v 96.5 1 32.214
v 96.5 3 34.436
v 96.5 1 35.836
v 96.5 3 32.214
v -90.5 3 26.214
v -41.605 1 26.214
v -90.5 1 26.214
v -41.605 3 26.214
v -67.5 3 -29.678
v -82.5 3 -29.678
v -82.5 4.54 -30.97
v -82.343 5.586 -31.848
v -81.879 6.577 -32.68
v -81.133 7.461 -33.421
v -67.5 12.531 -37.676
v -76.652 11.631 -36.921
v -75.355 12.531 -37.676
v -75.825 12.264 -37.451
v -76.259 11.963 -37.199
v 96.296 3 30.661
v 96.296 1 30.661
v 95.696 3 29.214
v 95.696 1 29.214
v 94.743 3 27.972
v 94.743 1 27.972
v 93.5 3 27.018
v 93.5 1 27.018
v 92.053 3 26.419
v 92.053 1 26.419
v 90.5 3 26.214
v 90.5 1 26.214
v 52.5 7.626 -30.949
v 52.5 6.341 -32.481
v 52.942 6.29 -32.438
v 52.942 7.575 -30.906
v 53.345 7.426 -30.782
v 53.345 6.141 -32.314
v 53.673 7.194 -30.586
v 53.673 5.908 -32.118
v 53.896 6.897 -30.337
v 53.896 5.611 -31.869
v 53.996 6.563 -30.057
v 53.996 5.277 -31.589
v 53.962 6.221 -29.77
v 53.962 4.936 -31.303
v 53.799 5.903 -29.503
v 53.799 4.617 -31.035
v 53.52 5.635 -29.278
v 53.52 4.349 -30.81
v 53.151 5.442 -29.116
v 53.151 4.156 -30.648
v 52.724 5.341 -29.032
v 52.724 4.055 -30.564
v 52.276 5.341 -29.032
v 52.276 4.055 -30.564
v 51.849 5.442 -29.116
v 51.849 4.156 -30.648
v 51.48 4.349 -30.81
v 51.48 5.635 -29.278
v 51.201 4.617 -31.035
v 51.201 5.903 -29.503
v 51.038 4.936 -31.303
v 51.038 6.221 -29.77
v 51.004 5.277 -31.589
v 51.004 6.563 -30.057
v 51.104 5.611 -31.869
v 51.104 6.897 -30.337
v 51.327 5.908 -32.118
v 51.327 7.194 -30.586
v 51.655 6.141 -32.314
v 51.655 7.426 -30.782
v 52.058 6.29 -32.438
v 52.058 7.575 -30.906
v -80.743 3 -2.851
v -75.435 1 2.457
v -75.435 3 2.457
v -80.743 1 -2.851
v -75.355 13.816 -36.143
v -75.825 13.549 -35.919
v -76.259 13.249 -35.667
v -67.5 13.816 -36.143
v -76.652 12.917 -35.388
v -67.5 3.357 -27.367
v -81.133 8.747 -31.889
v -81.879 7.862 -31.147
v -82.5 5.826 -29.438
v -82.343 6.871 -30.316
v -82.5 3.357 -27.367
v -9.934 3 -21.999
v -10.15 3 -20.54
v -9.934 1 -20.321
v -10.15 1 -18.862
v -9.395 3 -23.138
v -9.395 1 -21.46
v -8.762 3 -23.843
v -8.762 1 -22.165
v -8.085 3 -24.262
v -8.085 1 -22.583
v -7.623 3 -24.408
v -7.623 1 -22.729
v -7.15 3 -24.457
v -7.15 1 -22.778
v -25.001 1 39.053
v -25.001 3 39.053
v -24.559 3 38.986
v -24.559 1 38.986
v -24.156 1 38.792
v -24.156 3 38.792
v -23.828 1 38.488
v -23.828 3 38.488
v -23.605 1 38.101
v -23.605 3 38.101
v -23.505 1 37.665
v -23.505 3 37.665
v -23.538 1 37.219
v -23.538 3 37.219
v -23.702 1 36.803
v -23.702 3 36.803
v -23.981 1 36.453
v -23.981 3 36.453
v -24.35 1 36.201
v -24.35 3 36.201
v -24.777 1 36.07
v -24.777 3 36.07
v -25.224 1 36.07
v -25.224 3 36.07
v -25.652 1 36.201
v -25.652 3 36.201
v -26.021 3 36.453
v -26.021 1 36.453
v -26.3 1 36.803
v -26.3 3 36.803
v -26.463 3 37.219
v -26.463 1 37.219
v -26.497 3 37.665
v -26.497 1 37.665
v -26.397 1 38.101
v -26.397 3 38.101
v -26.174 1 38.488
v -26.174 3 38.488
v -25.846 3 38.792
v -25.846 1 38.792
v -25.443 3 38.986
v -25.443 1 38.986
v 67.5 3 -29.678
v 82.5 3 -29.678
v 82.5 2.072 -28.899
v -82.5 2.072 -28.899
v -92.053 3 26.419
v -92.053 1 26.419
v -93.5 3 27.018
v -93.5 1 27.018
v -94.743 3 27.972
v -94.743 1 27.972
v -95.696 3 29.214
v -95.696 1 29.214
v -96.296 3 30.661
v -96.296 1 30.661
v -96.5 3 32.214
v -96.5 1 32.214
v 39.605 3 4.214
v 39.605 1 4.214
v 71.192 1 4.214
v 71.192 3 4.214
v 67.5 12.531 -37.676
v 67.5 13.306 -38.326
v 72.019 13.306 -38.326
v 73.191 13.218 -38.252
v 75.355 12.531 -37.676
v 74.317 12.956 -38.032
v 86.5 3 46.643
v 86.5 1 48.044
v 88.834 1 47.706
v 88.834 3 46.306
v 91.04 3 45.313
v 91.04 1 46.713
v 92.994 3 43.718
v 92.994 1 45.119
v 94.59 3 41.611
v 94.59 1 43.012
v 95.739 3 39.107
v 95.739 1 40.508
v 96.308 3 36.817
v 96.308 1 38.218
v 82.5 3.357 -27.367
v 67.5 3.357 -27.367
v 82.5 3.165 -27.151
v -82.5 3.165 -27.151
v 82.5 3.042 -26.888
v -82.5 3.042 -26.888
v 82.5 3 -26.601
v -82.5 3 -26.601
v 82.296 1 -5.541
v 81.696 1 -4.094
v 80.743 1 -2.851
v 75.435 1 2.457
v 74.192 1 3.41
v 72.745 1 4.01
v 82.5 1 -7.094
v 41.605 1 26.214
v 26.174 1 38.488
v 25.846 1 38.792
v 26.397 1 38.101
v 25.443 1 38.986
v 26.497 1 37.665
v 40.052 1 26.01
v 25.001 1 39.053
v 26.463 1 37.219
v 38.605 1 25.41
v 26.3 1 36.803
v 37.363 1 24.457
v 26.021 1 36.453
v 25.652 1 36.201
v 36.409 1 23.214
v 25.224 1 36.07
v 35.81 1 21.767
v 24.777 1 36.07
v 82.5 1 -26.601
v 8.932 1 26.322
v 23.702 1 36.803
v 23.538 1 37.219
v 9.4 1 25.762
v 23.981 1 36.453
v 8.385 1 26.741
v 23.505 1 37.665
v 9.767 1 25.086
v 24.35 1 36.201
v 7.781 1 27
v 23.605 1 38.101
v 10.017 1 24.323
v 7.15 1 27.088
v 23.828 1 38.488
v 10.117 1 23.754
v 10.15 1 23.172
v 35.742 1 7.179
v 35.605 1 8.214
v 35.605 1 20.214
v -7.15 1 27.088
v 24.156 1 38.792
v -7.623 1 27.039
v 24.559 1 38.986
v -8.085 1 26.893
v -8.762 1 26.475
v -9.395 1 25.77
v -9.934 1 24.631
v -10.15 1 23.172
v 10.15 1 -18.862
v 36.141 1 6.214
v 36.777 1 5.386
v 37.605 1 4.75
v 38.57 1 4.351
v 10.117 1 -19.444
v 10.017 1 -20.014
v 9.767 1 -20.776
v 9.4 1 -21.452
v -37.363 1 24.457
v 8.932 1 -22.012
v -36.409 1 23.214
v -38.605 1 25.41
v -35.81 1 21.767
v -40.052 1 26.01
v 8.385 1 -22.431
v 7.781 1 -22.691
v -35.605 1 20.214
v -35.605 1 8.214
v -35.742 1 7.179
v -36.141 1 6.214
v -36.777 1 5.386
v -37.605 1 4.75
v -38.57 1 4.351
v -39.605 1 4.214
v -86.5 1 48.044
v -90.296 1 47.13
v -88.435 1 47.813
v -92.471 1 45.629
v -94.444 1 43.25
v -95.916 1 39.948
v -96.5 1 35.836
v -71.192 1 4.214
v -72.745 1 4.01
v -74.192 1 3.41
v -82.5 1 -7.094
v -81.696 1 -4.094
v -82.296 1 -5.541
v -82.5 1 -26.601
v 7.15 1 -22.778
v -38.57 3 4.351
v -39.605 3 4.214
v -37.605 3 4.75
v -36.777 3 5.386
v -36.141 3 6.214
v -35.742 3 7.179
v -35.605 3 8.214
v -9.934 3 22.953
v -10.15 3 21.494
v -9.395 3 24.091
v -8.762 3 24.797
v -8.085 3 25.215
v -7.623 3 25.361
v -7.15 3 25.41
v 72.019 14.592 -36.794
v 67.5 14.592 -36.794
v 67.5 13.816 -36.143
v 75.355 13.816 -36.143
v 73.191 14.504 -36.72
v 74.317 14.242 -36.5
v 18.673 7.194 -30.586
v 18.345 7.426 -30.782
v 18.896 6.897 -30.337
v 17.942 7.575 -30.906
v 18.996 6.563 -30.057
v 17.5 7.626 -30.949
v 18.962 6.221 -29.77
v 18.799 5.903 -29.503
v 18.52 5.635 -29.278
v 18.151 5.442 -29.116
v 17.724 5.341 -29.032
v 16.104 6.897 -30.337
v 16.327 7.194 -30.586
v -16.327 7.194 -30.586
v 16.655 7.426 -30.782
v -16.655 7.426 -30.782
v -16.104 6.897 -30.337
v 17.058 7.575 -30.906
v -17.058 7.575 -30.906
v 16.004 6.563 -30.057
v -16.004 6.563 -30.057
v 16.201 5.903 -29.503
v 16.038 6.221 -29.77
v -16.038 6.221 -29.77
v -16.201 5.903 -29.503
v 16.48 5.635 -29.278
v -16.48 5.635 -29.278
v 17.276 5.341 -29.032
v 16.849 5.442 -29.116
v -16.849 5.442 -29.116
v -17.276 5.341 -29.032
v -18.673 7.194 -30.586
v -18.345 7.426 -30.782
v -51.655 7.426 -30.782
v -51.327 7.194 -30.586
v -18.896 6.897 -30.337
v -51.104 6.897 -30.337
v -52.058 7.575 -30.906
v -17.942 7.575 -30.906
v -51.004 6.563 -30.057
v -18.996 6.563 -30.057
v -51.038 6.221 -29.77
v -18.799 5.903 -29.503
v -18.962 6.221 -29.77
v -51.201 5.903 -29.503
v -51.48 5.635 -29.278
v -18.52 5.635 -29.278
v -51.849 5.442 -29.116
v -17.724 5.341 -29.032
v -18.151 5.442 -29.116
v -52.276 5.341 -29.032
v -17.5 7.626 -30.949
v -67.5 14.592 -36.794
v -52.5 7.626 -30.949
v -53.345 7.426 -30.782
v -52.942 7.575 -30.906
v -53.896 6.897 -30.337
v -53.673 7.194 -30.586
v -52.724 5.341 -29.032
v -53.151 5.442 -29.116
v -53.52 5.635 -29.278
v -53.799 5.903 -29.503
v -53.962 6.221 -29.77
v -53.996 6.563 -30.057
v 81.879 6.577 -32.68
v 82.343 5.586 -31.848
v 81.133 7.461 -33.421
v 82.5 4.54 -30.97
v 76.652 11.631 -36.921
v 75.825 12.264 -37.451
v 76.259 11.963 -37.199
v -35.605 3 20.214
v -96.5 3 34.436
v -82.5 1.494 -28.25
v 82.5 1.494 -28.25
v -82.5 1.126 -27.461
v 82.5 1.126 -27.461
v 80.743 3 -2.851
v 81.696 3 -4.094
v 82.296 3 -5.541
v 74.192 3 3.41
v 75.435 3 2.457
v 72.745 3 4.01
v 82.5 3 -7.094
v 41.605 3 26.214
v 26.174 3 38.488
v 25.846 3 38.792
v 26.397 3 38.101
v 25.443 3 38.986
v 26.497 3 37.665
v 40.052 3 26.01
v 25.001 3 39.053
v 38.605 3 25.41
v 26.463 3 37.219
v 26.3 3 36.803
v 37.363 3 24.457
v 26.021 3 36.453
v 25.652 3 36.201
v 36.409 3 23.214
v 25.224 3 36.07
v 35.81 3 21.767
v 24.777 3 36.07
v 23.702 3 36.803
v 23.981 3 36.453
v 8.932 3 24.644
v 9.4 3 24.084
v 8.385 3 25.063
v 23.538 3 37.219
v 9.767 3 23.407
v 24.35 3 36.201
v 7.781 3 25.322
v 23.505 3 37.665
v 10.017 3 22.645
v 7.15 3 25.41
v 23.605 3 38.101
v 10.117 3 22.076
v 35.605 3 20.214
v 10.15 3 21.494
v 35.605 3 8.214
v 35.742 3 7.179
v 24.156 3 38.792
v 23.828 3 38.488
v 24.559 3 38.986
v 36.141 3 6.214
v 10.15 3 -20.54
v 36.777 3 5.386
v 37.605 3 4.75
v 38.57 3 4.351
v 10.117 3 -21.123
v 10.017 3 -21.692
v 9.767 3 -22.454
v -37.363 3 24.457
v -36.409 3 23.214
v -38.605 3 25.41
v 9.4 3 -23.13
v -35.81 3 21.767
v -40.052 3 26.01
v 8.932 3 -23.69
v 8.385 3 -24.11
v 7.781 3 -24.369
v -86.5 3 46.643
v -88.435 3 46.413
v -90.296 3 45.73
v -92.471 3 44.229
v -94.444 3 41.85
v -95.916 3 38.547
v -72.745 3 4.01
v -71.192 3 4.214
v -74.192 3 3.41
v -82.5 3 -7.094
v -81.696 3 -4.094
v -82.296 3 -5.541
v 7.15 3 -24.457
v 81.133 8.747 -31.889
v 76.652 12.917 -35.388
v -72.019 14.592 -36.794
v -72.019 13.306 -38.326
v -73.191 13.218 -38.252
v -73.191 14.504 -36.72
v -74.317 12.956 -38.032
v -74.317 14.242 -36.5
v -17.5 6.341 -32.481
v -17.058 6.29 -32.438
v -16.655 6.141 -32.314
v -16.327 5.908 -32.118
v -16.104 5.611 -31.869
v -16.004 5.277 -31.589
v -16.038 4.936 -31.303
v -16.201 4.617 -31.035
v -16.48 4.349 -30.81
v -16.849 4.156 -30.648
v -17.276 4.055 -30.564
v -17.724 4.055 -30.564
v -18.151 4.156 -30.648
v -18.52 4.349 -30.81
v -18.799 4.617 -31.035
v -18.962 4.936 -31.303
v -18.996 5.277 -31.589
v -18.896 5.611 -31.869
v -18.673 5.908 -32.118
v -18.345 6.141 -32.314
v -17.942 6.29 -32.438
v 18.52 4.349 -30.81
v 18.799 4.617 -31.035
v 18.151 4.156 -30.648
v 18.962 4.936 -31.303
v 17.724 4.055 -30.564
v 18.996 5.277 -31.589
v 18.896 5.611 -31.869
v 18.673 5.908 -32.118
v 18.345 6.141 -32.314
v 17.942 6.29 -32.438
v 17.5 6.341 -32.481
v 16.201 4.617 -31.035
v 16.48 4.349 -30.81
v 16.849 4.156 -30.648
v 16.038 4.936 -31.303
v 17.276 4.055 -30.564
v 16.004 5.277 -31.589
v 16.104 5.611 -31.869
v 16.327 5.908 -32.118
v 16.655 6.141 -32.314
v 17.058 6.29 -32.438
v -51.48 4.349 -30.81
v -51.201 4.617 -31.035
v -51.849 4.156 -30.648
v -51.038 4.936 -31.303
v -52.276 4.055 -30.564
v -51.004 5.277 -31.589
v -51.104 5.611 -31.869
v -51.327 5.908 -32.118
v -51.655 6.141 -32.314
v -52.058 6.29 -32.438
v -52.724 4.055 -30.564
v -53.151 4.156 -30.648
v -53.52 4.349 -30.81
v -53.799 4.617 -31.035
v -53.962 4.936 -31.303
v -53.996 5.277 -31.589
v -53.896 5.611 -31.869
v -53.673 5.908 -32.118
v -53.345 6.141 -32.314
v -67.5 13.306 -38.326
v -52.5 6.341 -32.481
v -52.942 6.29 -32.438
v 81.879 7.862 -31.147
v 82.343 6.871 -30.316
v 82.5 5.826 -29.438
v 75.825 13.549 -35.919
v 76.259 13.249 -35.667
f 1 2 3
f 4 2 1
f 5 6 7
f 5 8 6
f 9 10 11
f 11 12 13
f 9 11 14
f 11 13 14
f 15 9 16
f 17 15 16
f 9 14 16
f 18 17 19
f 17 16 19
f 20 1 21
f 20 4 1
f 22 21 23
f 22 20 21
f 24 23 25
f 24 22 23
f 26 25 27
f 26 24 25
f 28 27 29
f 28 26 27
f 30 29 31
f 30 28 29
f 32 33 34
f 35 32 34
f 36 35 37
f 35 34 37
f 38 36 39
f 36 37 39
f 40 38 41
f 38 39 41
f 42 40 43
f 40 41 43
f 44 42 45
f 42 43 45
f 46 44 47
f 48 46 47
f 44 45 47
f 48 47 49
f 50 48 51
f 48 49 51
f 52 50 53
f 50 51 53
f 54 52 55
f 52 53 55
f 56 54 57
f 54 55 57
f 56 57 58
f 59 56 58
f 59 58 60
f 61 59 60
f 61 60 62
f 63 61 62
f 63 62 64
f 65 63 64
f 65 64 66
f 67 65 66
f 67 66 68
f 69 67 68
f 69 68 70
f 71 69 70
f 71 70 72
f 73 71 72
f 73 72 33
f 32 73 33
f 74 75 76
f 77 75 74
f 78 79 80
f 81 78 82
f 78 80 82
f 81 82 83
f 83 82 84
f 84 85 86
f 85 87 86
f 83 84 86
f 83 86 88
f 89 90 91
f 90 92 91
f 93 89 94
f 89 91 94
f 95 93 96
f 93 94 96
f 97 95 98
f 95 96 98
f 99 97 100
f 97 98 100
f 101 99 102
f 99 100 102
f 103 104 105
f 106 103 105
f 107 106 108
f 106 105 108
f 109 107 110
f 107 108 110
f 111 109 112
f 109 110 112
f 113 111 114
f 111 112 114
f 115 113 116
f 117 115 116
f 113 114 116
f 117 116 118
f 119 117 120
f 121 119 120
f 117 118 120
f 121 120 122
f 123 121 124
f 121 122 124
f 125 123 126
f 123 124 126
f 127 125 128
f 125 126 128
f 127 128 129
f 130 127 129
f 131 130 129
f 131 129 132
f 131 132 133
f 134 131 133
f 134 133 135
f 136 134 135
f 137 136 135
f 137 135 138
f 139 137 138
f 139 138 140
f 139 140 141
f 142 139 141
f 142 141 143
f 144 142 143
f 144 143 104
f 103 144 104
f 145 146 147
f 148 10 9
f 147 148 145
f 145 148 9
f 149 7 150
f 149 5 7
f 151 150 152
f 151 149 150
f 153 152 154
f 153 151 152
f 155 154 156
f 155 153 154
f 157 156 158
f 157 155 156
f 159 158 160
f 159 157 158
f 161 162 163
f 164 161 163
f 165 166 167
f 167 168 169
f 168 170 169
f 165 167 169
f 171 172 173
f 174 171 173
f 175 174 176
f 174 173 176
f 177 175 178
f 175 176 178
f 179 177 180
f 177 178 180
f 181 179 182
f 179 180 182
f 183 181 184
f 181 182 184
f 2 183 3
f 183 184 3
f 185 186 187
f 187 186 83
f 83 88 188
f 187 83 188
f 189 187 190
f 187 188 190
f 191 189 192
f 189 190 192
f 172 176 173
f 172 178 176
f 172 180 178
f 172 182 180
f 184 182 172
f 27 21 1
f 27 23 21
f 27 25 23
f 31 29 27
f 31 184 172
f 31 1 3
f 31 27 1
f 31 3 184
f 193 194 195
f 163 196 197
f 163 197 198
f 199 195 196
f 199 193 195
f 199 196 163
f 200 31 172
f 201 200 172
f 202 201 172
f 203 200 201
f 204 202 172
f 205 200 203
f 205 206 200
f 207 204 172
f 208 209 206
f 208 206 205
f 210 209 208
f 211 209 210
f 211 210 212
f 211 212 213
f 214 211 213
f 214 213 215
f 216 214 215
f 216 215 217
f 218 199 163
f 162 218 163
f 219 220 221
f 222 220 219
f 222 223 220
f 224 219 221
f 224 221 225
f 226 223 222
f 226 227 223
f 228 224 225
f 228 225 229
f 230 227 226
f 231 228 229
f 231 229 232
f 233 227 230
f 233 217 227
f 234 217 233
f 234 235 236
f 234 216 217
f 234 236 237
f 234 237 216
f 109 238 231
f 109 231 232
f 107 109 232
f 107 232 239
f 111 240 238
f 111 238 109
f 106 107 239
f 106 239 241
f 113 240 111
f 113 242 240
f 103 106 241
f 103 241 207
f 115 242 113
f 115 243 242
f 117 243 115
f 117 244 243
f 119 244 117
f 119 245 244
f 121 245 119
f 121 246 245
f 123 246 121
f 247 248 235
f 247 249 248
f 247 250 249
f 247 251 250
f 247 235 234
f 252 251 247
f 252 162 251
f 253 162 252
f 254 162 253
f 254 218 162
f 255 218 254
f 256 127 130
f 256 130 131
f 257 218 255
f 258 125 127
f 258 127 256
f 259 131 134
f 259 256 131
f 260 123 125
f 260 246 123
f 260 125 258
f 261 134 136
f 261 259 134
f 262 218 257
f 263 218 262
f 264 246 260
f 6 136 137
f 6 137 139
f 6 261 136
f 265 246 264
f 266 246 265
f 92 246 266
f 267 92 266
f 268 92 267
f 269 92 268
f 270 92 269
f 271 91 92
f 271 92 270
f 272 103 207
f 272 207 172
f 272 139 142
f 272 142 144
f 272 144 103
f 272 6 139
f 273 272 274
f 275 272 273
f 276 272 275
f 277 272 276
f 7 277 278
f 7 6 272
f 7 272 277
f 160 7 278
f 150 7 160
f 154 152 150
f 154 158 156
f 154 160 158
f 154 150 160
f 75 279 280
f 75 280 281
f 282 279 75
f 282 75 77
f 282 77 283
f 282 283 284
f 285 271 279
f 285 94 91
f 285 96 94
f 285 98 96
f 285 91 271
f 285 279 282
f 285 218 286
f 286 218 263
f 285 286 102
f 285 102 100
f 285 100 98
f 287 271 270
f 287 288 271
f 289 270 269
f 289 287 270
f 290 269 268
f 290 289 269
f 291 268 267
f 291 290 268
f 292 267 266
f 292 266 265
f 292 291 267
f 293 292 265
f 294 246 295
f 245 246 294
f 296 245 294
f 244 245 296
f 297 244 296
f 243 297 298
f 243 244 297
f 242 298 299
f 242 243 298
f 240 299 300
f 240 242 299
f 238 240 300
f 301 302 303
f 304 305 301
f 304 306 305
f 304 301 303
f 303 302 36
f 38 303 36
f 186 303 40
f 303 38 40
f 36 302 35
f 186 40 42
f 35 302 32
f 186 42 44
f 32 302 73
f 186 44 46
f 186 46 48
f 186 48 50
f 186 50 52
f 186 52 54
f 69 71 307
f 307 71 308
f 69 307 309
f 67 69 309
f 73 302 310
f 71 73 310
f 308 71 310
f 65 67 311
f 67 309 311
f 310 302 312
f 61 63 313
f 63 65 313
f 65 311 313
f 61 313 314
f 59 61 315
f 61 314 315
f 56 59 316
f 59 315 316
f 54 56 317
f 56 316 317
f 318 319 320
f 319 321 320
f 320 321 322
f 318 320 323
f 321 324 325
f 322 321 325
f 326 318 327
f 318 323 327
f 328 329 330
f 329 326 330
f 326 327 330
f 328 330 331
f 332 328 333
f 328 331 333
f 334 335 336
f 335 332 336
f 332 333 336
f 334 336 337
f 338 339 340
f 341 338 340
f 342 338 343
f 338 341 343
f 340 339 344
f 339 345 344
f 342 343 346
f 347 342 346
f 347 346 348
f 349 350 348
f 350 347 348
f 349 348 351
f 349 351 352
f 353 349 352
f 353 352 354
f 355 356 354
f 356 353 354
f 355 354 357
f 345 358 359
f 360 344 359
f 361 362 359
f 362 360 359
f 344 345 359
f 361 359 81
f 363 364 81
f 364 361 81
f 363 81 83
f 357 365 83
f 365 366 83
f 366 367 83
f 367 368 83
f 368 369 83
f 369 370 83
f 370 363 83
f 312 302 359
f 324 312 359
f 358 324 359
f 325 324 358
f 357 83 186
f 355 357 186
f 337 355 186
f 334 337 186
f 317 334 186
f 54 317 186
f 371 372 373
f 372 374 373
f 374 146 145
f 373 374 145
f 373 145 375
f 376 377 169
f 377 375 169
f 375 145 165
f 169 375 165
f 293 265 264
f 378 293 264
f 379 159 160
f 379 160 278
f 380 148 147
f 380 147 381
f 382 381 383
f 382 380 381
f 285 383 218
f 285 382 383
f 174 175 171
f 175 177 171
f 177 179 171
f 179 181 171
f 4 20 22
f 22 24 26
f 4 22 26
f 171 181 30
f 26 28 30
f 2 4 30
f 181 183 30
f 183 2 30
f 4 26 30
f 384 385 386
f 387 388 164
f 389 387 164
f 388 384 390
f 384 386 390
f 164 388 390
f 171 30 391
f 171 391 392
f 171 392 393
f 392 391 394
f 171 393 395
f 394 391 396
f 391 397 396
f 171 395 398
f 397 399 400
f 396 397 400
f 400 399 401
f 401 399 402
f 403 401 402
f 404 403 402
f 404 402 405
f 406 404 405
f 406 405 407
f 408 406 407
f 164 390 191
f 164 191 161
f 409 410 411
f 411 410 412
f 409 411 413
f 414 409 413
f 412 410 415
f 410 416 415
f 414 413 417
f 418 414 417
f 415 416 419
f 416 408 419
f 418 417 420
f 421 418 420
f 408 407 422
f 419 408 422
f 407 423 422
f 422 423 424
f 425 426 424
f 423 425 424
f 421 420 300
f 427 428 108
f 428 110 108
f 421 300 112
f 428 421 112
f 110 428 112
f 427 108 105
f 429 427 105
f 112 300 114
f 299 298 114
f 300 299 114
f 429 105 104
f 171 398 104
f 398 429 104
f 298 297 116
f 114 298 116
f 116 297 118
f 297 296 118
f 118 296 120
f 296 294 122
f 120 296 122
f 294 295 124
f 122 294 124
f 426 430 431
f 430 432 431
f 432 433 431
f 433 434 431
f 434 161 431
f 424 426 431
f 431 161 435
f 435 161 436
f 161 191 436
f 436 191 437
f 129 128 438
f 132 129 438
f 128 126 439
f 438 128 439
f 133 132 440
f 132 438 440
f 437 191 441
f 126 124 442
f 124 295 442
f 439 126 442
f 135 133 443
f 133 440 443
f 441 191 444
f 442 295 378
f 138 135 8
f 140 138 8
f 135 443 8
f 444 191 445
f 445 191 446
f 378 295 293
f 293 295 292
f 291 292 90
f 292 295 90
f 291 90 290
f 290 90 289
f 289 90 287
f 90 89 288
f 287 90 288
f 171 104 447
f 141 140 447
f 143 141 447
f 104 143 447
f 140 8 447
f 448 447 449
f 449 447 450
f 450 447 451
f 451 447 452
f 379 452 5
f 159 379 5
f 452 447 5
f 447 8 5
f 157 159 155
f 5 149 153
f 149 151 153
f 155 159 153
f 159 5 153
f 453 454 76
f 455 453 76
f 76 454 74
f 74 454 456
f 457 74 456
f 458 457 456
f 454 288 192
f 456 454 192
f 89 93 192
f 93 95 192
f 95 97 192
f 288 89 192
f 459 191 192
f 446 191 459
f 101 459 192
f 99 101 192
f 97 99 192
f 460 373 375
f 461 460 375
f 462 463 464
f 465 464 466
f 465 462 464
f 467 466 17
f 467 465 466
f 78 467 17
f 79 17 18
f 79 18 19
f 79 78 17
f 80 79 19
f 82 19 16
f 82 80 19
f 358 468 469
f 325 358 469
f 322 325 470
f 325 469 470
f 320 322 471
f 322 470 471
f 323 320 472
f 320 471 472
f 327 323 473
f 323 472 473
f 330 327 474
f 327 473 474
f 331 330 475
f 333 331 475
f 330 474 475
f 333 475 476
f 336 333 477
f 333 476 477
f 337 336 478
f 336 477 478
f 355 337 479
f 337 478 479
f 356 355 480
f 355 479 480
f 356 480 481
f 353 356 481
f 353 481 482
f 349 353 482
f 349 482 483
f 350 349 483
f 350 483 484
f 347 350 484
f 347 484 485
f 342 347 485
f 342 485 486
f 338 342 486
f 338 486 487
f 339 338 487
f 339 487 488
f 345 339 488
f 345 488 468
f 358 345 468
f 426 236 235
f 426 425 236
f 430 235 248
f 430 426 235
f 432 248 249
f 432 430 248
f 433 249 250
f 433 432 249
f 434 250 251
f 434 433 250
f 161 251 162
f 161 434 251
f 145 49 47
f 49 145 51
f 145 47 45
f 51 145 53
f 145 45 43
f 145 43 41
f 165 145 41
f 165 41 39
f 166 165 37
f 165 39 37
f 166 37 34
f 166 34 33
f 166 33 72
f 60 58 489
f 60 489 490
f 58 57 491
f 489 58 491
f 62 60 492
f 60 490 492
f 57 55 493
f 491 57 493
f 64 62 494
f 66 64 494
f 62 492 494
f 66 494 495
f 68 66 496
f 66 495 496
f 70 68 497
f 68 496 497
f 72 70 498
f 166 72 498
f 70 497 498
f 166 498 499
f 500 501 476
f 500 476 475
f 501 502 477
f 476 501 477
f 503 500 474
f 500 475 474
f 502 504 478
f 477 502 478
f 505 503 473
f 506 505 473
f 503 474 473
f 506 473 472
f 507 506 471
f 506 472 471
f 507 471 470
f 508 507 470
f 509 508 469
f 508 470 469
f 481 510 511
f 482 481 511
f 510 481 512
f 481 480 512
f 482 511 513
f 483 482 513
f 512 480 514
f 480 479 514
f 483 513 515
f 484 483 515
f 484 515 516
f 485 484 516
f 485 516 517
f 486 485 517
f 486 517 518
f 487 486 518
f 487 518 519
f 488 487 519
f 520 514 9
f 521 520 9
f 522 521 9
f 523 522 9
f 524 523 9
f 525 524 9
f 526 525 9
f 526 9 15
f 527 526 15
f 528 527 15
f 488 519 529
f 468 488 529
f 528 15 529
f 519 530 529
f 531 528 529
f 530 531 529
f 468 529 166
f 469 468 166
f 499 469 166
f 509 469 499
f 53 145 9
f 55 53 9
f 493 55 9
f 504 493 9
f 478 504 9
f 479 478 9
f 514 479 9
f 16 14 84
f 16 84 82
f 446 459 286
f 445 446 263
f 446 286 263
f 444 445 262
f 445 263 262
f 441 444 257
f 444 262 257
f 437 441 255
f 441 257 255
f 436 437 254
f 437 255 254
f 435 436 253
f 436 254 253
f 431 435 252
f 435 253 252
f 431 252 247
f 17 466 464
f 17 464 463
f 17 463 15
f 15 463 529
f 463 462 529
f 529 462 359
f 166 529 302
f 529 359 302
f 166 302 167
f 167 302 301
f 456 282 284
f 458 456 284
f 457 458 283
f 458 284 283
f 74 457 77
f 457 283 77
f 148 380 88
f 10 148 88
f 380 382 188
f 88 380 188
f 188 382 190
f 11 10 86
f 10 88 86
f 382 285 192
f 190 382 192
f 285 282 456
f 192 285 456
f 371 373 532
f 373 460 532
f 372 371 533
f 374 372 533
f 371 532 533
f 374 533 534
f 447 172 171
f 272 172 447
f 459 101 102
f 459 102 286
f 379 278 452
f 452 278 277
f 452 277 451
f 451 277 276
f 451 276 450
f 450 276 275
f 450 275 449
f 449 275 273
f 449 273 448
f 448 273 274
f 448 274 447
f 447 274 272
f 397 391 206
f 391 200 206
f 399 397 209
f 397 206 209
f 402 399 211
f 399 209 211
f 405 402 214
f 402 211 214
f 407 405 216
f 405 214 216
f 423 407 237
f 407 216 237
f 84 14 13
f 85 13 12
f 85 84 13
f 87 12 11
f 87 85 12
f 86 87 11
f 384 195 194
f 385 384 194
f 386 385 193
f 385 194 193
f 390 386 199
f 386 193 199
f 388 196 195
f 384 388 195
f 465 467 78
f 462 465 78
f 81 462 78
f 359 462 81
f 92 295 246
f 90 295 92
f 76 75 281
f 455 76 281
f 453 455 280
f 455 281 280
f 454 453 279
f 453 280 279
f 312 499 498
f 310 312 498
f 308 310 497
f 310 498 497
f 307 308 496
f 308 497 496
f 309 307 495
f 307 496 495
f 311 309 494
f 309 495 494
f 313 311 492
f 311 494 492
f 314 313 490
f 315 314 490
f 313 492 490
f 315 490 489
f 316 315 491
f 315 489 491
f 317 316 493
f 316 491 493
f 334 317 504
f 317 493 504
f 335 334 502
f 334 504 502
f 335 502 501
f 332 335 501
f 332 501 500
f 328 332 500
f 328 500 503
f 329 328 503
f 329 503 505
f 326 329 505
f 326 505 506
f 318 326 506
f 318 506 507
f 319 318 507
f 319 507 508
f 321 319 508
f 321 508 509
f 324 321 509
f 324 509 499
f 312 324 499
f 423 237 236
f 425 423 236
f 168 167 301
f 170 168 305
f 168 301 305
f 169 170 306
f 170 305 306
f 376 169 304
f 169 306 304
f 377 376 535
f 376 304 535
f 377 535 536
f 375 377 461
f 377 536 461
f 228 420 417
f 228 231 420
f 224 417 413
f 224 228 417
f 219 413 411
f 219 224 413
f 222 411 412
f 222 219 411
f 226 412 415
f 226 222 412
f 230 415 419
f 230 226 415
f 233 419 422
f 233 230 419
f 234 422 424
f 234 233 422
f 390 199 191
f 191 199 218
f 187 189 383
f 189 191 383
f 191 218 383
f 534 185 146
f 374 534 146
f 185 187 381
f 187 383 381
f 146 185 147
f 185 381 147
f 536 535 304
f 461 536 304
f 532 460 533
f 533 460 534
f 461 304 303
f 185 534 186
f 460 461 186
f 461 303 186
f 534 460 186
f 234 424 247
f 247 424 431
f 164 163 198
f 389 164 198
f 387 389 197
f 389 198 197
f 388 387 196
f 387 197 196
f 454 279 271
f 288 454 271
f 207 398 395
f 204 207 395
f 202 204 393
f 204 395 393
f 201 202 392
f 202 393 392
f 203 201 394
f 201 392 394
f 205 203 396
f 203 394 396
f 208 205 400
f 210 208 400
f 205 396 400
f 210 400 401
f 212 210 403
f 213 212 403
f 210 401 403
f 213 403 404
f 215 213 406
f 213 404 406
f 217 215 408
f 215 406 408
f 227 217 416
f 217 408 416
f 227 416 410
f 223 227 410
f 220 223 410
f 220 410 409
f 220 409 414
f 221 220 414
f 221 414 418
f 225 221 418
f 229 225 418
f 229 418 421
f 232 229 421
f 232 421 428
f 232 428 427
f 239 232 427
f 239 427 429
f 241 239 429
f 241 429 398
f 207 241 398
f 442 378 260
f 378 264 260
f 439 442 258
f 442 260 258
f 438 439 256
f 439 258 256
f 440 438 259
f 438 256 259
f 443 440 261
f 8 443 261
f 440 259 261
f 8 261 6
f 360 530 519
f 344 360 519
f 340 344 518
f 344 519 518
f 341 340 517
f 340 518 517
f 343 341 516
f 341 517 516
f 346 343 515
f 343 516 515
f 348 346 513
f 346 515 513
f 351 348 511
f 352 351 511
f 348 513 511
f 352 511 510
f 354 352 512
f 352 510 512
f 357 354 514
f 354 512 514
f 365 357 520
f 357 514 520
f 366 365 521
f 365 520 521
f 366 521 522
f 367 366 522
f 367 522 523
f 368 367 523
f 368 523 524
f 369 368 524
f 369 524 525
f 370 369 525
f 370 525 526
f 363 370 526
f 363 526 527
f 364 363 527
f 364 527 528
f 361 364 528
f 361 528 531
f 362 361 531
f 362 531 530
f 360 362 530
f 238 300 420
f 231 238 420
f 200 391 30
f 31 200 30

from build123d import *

# Parameters (mm, degrees)
SKETCH_1_W              = 165
SKETCH_1_H              = 108
EXTRUDE_1_DEPTH         = 3
SHEET_METAL_2_OUTLINE_W = 165
SHEET_METAL_2_OUTLINE_H = 108
SHEET_METAL_2_DEPTH     = 1
OTHER_START             = -82.5
OTHER_1_DEPTH           = 165
OTHER_1_2_DEPTH         = 165
SKETCH_14_W             = 50
SKETCH_14_H             = 35
CUT_EXTRUDE_1_DEPTH     = 2
FILLET_1_R              = 5
SKETCH_20_R             = 1.75
CUT_EXTRUDE_7_DEPTH     = 10
SKETCH_24_W             = 165
SKETCH_24_H             = 1
CUT_EXTRUDE_11_DEPTH    = 10
SKETCH_25_W             = 17
SKETCH_25_H             = 2
EXTRUDE_2_DEPTH         = 14
SKETCH_26_W             = 17
SKETCH_26_H             = 2
EXTRUDE_3_DEPTH         = 14
FILLET_6_R              = 10
SKETCH_27_R             = 2.25
CUT_EXTRUDE_12_DEPTH    = 10
SKETCH_28_R             = 1.75
CUT_EXTRUDE_13_DEPTH    = 113.27486947
SKETCH_29_W             = 15
SKETCH_29_H             = 12
CUT_EXTRUDE_14_DEPTH    = 10
FILLET_8_R              = 3
OTHER_START_2           = 3
OTHER_1_3_DEPTH         = 21
OTHER_START_3           = 1
OTHER_1_3_2_OUTLINE_R   = 1.75
OTHER_1_3_2_DEPTH       = 2
OTHER_START_4           = -42
OTHER_1_4_OUTLINE_R     = 1.75
OTHER_1_4_DEPTH         = 10.030896321
OTHER_1_4_2_DEPTH       = 165
OTHER_START_5           = -67.5
OTHER_1_4_3_DEPTH       = 135
OTHER_1_4_4_DEPTH       = 165
OTHER_START_6           = -20.806456798
OTHER_1_4_5_OUTLINE_R   = 1.75
OTHER_1_4_5_DEPTH       = 2
CUT_EXTRUDE_20_DEPTH    = 10
FILLET_9_R              = 3
EXTRUDE_4_DEPTH         = 2
EXTRUDE_5_DEPTH         = 2
CUT_EXTRUDE_21_REACH    = 133.427
SKETCH_34_W             = 20.3
SKETCH_34_H             = 38.2
SKETCH_38_R             = 2.25
SKETCH_38_R_2           = 1.75
EXTRUDE_6_DEPTH         = 2
CUT_EXTRUDE_23_DEPTH    = 10
EXTRUDE_START           = -2
SKETCH_47_R             = 1.75
EXTRUDE_9_DEPTH         = 2
CUT_EXTRUDE_27_DEPTH    = 10
FILLET_14_R             = 3.3
FILLET_17_R             = 3
SKETCH_51_W             = 12.822687145
SKETCH_51_H             = 2
EXTRUDE_12_DEPTH        = 24
SKETCH_56_W             = 8.820712464
SKETCH_56_H             = 2.159181397
SKETCH_56_W_2           = 10.112203134
EXTRUDE_13_DEPTH        = 2
SKETCH_55_W             = 243.511424265
SKETCH_55_H             = 14.236732763
CUT_EXTRUDE_29_DEPTH    = 123.832146316
CUT_EXTRUDE_30_REACH    = 112.932
SKETCH_58_W             = 44.071930239
SKETCH_58_H             = 30
CUT_EXTRUDE_33_REACH    = 119.8
SKETCH_62_W             = 205
SKETCH_62_H             = 60.625088721
FILLET_18_R             = 4
SKETCH_63_R             = 1.5
CUT_EXTRUDE_34_DEPTH    = 10
CUT_EXTRUDE_35_REACH    = 110.652
EXTRUDE_16_DEPTH        = 8
EXTRUDE_16_DEPTH_BACK   = 5
FILLET_23_R             = 6
FILLET_25_R             = 6
CUT_EXTRUDE_36_DEPTH    = 4
FILLET_26_R             = 6
FILLET_27_R             = 10
CUT_EXTRUDE_38_REACH    = 110.42
SKETCH_72_R             = 1.5


with BuildPart() as part:
    # 草图1 → 凸台-拉伸1 (new body)
    with BuildSketch(Plane(origin=(0, 0, 0), x_dir=(1, 0, 0), z_dir=(0, 1, 0))):
        Rectangle(SKETCH_1_W, SKETCH_1_H)
    extrude(amount=EXTRUDE_1_DEPTH)

    # Sheet Metal 2: read off the stored shape, not the designer's step
    # Sheet Metal 2 outline → Sheet Metal 2 (cut)
    with BuildSketch(Plane(origin=(0, 0, 0), x_dir=(1, 0, 0), z_dir=(0, 1, 0))):
        Rectangle(SHEET_METAL_2_OUTLINE_W, SHEET_METAL_2_OUTLINE_H)
    extrude(amount=SHEET_METAL_2_DEPTH, mode=Mode.SUBTRACT)

    # Other 1: read off the stored shape, not the designer's step
    # Other 1 outline → Other 1 (cut)
    with BuildSketch(Plane.YZ.offset(OTHER_START)):
        with BuildLine():
            Line((3, -54), (3, -29.678199262))
            Line((3, -29.678199262), (2.071637171, -28.899210355))
            ThreePointArc((2.071637171, -28.899210355), (1.281076639, -27.868931811), (1, -26.601077026))
            Line((1, -26.601077026), (1, -54))
            Line((1, -54), (3, -54))
        make_face()
    extrude(amount=OTHER_1_DEPTH, mode=Mode.SUBTRACT)

    # Other 1 2 outline → Other 1 2 (add)
    with BuildSketch(Plane.YZ.offset(OTHER_START)):
        with BuildLine():
            Line((3, -29.678199262), (21.723430088, -45.389022544))
            Line((21.723430088, -45.389022544), (23.009005307, -43.856933657))
            Line((23.009005307, -43.856933657), (3.35721239, -27.367121469))
            ThreePointArc((3.35721239, -27.367121469), (3.093692213, -27.023695287), (3, -26.601077026))
            Line((3, -26.601077026), (3, -29.678199262))
        make_face()
    extrude(amount=OTHER_1_2_DEPTH)

    # 草图14 → 切除-拉伸1 (cut)
    with BuildSketch(Plane.XZ.offset(-1)):
        with Locations((35, -1.601077026)):
            Rectangle(SKETCH_14_W, SKETCH_14_H)
        with Locations((-35, -1.601077026)):
            Rectangle(SKETCH_14_W, SKETCH_14_H)
    extrude(amount=-CUT_EXTRUDE_1_DEPTH, mode=Mode.SUBTRACT)

    # 圆角1
    fillet_1_edges = [part.edges().sort_by_distance(p)[0] for p in [
        (60, 2, 15.898922974),
        (60, 2, -19.101077026),
        (10, 2, -19.101077026),
        (10, 2, 15.898922974),
        (-10, 2, 15.898922974),
        (-10, 2, -19.101077026),
        (-60, 2, -19.101077026),
        (-60, 2, 15.898922974),
    ]]
    fillet(fillet_1_edges, radius=FILLET_1_R)

    # 草图20 → 切除-拉伸7 (cut)
    with BuildSketch(Plane(origin=(0, -12.088557412, -14.406581725), x_dir=(1, 0, 0), z_dir=(0, 0.6427876096865379, 0.7660444431189792))):
        with Locations(Location((-17.5, 37.816614211, 0), (0, 0, 270))):
            Circle(SKETCH_20_R)
        with Locations(Location((-52.5, 37.816614211, 0), (0, 0, 270))):
            Circle(SKETCH_20_R)
        with Locations(Location((17.5, 37.816614211, 0), (0, 0, 270))):
            Circle(SKETCH_20_R)
        with Locations(Location((52.5, 37.816614211, 0), (0, 0, 270))):
            Circle(SKETCH_20_R)
    extrude(amount=-CUT_EXTRUDE_7_DEPTH, mode=Mode.SUBTRACT)

    # 草图24 → 切除-拉伸11 (cut)
    with BuildSketch(Plane(origin=(0, 3, 0), x_dir=(1, 0, 0), z_dir=(0, 1, 0))):
        with Locations((0, -53.5)):
            Rectangle(SKETCH_24_W, SKETCH_24_H)
    extrude(amount=-CUT_EXTRUDE_11_DEPTH, mode=Mode.SUBTRACT)

    # 草图25 → 凸台-拉伸2 (add)
    with BuildSketch(Plane.ZY.offset(82.5)):
        with Locations((44.5, 2)):
            Rectangle(SKETCH_25_W, SKETCH_25_H)
    extrude(amount=EXTRUDE_2_DEPTH)

    # 草图26 → 凸台-拉伸3 (add)
    with BuildSketch(Plane(origin=(82.5, 0, 0), x_dir=(0, 0, -1), z_dir=(1, 0, 0))):
        with Locations((-44.5, 2)):
            Rectangle(SKETCH_26_W, SKETCH_26_H)
    extrude(amount=EXTRUDE_3_DEPTH)

    # 圆角6
    fillet_6_edges = [part.edges().sort_by_distance(p)[0] for p in [
        (-82.5, 2, 36),
        (82.5, 2, 36),
    ]]
    fillet(fillet_6_edges, radius=FILLET_6_R)

    # 草图27 → 切除-拉伸12 (cut)
    with BuildSketch(Plane(origin=(0, 3, 0), x_dir=(1, 0, 0), z_dir=(0, 1, 0))):
        with Locations(Location((-73.3, -43.8, 0), (0, 0, 270))):
            Circle(SKETCH_27_R)
        with Locations(Location((73.3, -43.8, 0), (0, 0, 270))):
            Circle(SKETCH_27_R)
    extrude(amount=-CUT_EXTRUDE_12_DEPTH, mode=Mode.SUBTRACT)

    # 草图28 → 切除-拉伸13 (cut, through all)
    with BuildSketch(Plane.XZ.offset(-1)):
        with Locations(Location((-70.5, 8.898922974, 0), (0, 0, 270))):
            Circle(SKETCH_28_R)
        with Locations(Location((70.5, 8.898922974, 0), (0, 0, 270))):
            Circle(SKETCH_28_R)
    extrude(amount=-CUT_EXTRUDE_13_DEPTH, mode=Mode.SUBTRACT)

    # 草图29 → 切除-拉伸14 (cut)
    with BuildSketch(Plane(origin=(0, -12.088557412, -14.406581725), x_dir=(1, 0, 0), z_dir=(0, 0.6427876096865379, 0.7660444431189792))):
        with Locations((-75, 39.816614211)):
            Rectangle(SKETCH_29_W, SKETCH_29_H)
        with Locations((75, 39.816614211)):
            Rectangle(SKETCH_29_W, SKETCH_29_H)
    extrude(amount=-CUT_EXTRUDE_14_DEPTH, mode=Mode.SUBTRACT)

    # 圆角8
    fillet_8_edges = [part.edges().sort_by_distance(p)[0] for p in [
        (-96.5, 2, 53),
        (-96.5, 2, 36),
        (96.5, 2, 53),
        (96.5, 2, 36),
    ]]
    fillet(fillet_8_edges, radius=FILLET_8_R)

    # Other 1 3: read off the stored shape, not the designer's step
    # Other 1 3 outline → Other 1 3 (cut)
    with BuildSketch(Plane(origin=(0, 0, 0), x_dir=(1, 0, 0), z_dir=(0, 1, 0)).offset(OTHER_START_2)):
        Polygon((-67.5, 42), (-82.5, 42), (-82.5, 25), (82.5, 25), (82.5, 42), (67.5, 42), (67.5, 54), (-67.5, 54), align=None)
    extrude(amount=OTHER_1_3_DEPTH, mode=Mode.SUBTRACT)

    # Other 1 3 2 outline → Other 1 3 2 (add)
    with BuildSketch(Plane(origin=(0, 0, 0), x_dir=(1, 0, 0), z_dir=(0, 1, 0)).offset(OTHER_START_3)):
        Polygon((-67.5, 42), (-82.5, 42), (-82.5, 25), (82.5, 25), (82.5, 42), (67.5, 42), (67.5, 54), (-67.5, 54), align=None)
        with Locations((17.5, 46)):
            Circle(OTHER_1_3_2_OUTLINE_R, mode=Mode.SUBTRACT)
        with Locations((52.5, 46)):
            Circle(OTHER_1_3_2_OUTLINE_R, mode=Mode.SUBTRACT)
        with Locations((-52.5, 46)):
            Circle(OTHER_1_3_2_OUTLINE_R, mode=Mode.SUBTRACT)
        with Locations((-17.5, 46)):
            Circle(OTHER_1_3_2_OUTLINE_R, mode=Mode.SUBTRACT)
    extrude(amount=OTHER_1_3_2_DEPTH)

    # Other 1 4: read off the stored shape, not the designer's step
    # Other 1 4 outline → Other 1 4 (cut)
    with BuildSketch(Plane(origin=(0, 0, 0), x_dir=(1, 0, 0), z_dir=(0, 0.6427876096865381, 0.7660444431189791)).offset(OTHER_START_4)):
        with Locations((-17.5, 37.816614211)):
            Circle(OTHER_1_4_OUTLINE_R)
        with Locations((-52.5, 37.816614211)):
            Circle(OTHER_1_4_OUTLINE_R)
        with Locations((17.5, 37.816614211)):
            Circle(OTHER_1_4_OUTLINE_R)
        with Locations((52.5, 37.816614211)):
            Circle(OTHER_1_4_OUTLINE_R)
    extrude(amount=OTHER_1_4_DEPTH, mode=Mode.SUBTRACT)

    # Other 1 4 2 outline → Other 1 4 2 (cut)
    with BuildSketch(Plane.YZ.offset(OTHER_START)):
        with BuildLine():
            Line((3, -29.678199262), (2.071637171, -28.899210355))
            ThreePointArc((2.071637171, -28.899210355), (1.281076639, -27.868931811), (1, -26.601077026))
            Line((1, -26.601077026), (1, -54))
            Line((1, -54), (3, -54))
            Line((3, -54), (3, -29.678199262))
        make_face()
    extrude(amount=OTHER_1_4_2_DEPTH, mode=Mode.SUBTRACT)

    # Other 1 4 3 outline → Other 1 4 3 (add)
    with BuildSketch(Plane.YZ.offset(OTHER_START_5)):
        with BuildLine():
            Line((21.723430088, -45.389022544), (23.009005307, -43.856933657))
            Line((23.009005307, -43.856933657), (3.35721239, -27.367121469))
            ThreePointArc((3.35721239, -27.367121469), (3.093692213, -27.023695287), (3, -26.601077026))
            Line((3, -26.601077026), (3, -29.678199262))
            Line((3, -29.678199262), (21.723430088, -45.389022544))
        make_face()
    extrude(amount=OTHER_1_4_3_DEPTH)

    # Other 1 4 4 outline → Other 1 4 4 (add)
    with BuildSketch(Plane.YZ.offset(OTHER_START)):
        with BuildLine():
            Line((3, -29.678199262), (12.530896771, -37.675571228))
            Line((12.530896771, -37.675571228), (13.81647199, -36.143482341))
            Line((13.81647199, -36.143482341), (3.35721239, -27.367121469))
            ThreePointArc((3.35721239, -27.367121469), (3.093692213, -27.023695287), (3, -26.601077026))
            Line((3, -26.601077026), (3, -29.678199262))
        make_face()
    extrude(amount=OTHER_1_4_4_DEPTH)

    # Other 1 4 5 outline → Other 1 4 5 (cut)
    with BuildSketch(Plane(origin=(0, 0, 0), x_dir=(1, 0, 0), z_dir=(0, 0.6427876096865381, 0.7660444431189791)).offset(OTHER_START_6)):
        with Locations((-17.5, 37.816614211)):
            Circle(OTHER_1_4_5_OUTLINE_R)
        with Locations((-52.5, 37.816614211)):
            Circle(OTHER_1_4_5_OUTLINE_R)
        with Locations((17.5, 37.816614211)):
            Circle(OTHER_1_4_5_OUTLINE_R)
        with Locations((52.5, 37.816614211)):
            Circle(OTHER_1_4_5_OUTLINE_R)
    extrude(amount=OTHER_1_4_5_DEPTH, mode=Mode.SUBTRACT)

    # 草图31 → 切除-拉伸20 (cut)
    with BuildSketch(Plane(origin=(0, -12.088557412, -14.406581725), x_dir=(1, 0, 0), z_dir=(0, 0.6427876096865379, 0.7660444431189792))):
        Polygon((0, 45.816614211), (8, 45.816614211), (8, 39.795572536), (-8, 39.795572536), (-8, 45.816614211), align=None)
    extrude(amount=-CUT_EXTRUDE_20_DEPTH, mode=Mode.SUBTRACT)

    # 圆角9
    fillet_9_edges = [part.edges().sort_by_distance(p)[0] for p in [
        (8, 17.753832181, -40.752727114),
        (-8, 17.753832181, -40.752727114),
    ]]
    fillet(fillet_9_edges, radius=FILLET_9_R)

    # 草图32 → 凸台-拉伸4 (add)
    with BuildSketch(Plane(origin=(0, 3, 0), x_dir=(1, 0, 0), z_dir=(0, 1, 0))):
        with BuildLine():
            Line((55, -15.898922974), (15, -15.898922974))
            ThreePointArc((15, -15.898922974), (11.464466094, -14.43445688), (10, -10.898922974))
            Line((10, -10.898922974), (10, 14.101077026))
            ThreePointArc((10, 14.101077026), (11.464466094, 17.636610931), (15, 19.101077026))
            Line((15, 19.101077026), (55, 19.101077026))
            ThreePointArc((55, 19.101077026), (58.535533906, 17.636610931), (60, 14.101077026))
            Line((60, 14.101077026), (60, -10.898922974))
            ThreePointArc((60, -10.898922974), (58.535533906, -14.43445688), (55, -15.898922974))
        make_face()
    extrude(amount=-EXTRUDE_4_DEPTH)

    # 草图33 → 凸台-拉伸5 (add)
    with BuildSketch(Plane(origin=(0, 3, 0), x_dir=(1, 0, 0), z_dir=(0, 1, 0))):
        with BuildLine():
            Line((-55, 19.101077026), (-15, 19.101077026))
            ThreePointArc((-15, 19.101077026), (-11.464466094, 17.636610931), (-10, 14.101077026))
            Line((-10, 14.101077026), (-10, -10.898922974))
            ThreePointArc((-10, -10.898922974), (-11.464466094, -14.43445688), (-15, -15.898922974))
            Line((-15, -15.898922974), (-55, -15.898922974))
            ThreePointArc((-55, -15.898922974), (-58.535533906, -14.43445688), (-60, -10.898922974))
            Line((-60, -10.898922974), (-60, 14.101077026))
            ThreePointArc((-60, 14.101077026), (-58.535533906, 17.636610931), (-55, 19.101077026))
        make_face()
    extrude(amount=-EXTRUDE_5_DEPTH)

    # 切除-拉伸21: up to this plane
    cut_extrude_21_end = Plane(origin=(0, 1, 0), z_dir=(0, 1, 0))
    # 草图34 → 切除-拉伸21 (cut, up to the surface)
    with BuildSketch(Plane(origin=(0, 35.097562719, -29.450351933), x_dir=(1, 0, 0), z_dir=(0, 0.7660444431189792, -0.6427876096865379)), mode=Mode.PRIVATE) as cut_extrude_21_sk1:
        with Locations((0, -2.293543202)):
            Rectangle(SKETCH_34_W, SKETCH_34_H)
    cut_extrude_21_tool1 = split(extrude(cut_extrude_21_sk1.sketch, amount=-CUT_EXTRUDE_21_REACH, mode=Mode.PRIVATE), bisect_by=cut_extrude_21_end, keep=Keep.BOTH, mode=Mode.PRIVATE)
    add(cut_extrude_21_tool1.solids().sort_by_distance((0, 36.571824, -27.693396))[0], mode=Mode.SUBTRACT)

    # 草图38 → 凸台-拉伸6 (add)
    with BuildSketch(Plane.XZ.offset(-1)):
        with Locations((-73.3, 43.8)):
            Circle(SKETCH_38_R)
        with Locations((-70.5, 8.898922974)):
            Circle(SKETCH_38_R_2)
        with Locations((70.5, 8.898922974)):
            Circle(SKETCH_38_R_2)
        with Locations((73.3, 43.8)):
            Circle(SKETCH_38_R)
    extrude(amount=-EXTRUDE_6_DEPTH)

    # 草图41 → 切除-拉伸23 (cut)
    with BuildSketch(Plane.XZ.offset(-1)):
        Polygon((-79.183967725, 34.214311054), (-56.85462571, 34.214311054), (-56.85462571, 14.214311054), (-78.010881611, 14.214311054), (-82.5, 14.214311054), (-86.796922418, 34.214311054), align=None)
        Polygon((86.796922418, 34.214311054), (82.5, 14.214311054), (78.010881611, 14.214311054), (56.85462571, 14.214311054), (56.85462571, 34.214311054), (79.183967725, 34.214311054), align=None)
    extrude(amount=-CUT_EXTRUDE_23_DEPTH, mode=Mode.SUBTRACT)

    # 草图47 → 凸台-拉伸9 (add)
    with BuildSketch(Plane(origin=(0, -12.088557412, -14.406581725), x_dir=(1, 0, 0), z_dir=(0, 0.6427876096865379, 0.7660444431189792)).offset(EXTRUDE_START)):
        with Locations((-52.5, 37.816614211)):
            Circle(SKETCH_47_R)
        with Locations((-17.5, 38.795572536)):
            Circle(SKETCH_47_R)
        with Locations((17.5, 37.816614211)):
            Circle(SKETCH_47_R)
        with Locations((52.5, 37.816614211)):
            Circle(SKETCH_47_R)
    extrude(amount=EXTRUDE_9_DEPTH)

    # 草图50 → 切除-拉伸27 (cut)
    with BuildSketch(Plane(origin=(0, 3, 0), x_dir=(1, 0, 0), z_dir=(0, 1, 0))):
        Polygon((-69.677312855, -14.214311054), (-82.5, -1.391623909), (-82.5, -14.214311054), align=None)
    cut_extrude_27 = extrude(amount=-CUT_EXTRUDE_27_DEPTH, mode=Mode.SUBTRACT)

    # 圆角14
    fillet_14_edges = [part.edges().sort_by_distance(p)[0] for p in [
        (-82.5, 2, 1.391623909),
    ]]
    fillet(fillet_14_edges, radius=FILLET_14_R)

    # 镜向3: 切除-拉伸27 across plane
    add(cut_extrude_27.mirror(Plane(origin=(0, 0, 0), x_dir=(0, 0, 1), z_dir=(1, 0, 0))), mode=Mode.SUBTRACT)

    # 圆角17
    fillet_17_edges = [part.edges().sort_by_distance(p)[0] for p in [
        (-10.15, 2, 26.249087979),
        (-10.15, 2, -23.617470474),
        (10.15, 2, -23.617470474),
        (10.15, 2, 26.249087979),
    ]]
    fillet(fillet_17_edges, radius=FILLET_17_R)

    # 草图51 → 凸台-拉伸12 (add)
    with BuildSketch(Plane.XY.offset(14.214311054)):
        with Locations((-63.265969283, 2)):
            Rectangle(SKETCH_51_W, SKETCH_51_H)
    extrude_12 = extrude(amount=EXTRUDE_12_DEPTH)

    # 镜向4: 凸台-拉伸12 across plane
    add(extrude_12.mirror(Plane(origin=(0, 0, 0), x_dir=(0, 0, 1), z_dir=(1, 0, 0))))

    # 草图56 → 凸台-拉伸13 (add)
    with BuildSketch(Plane(origin=(0, -12.088557412, -14.406581725), x_dir=(1, 0, 0), z_dir=(0, 0.6427876096865379, 0.7660444431189792))):
        with Locations((-71.910356232, 34.896204909)):
            Rectangle(SKETCH_56_W, SKETCH_56_H)
        with Locations((72.556101567, 34.896204909)):
            Rectangle(SKETCH_56_W_2, SKETCH_56_H)
    extrude(amount=-EXTRUDE_13_DEPTH)

    # 草图55 → 切除-拉伸29 (cut, through all)
    with BuildSketch(Plane(origin=(0, -12.088557412, -14.406581725), x_dir=(1, 0, 0), z_dir=(0, 0.6427876096865379, 0.7660444431189792))):
        with Locations((-3.841223904, 41.947458337)):
            Rectangle(SKETCH_55_W, SKETCH_55_H)
    extrude(amount=-CUT_EXTRUDE_29_DEPTH, mode=Mode.SUBTRACT)

    # 草图58 → 切除-拉伸30 (cut, up to next)
    with BuildSketch(Plane.XZ.offset(-1), mode=Mode.PRIVATE) as cut_extrude_30_sk1:
        Polygon((35.605382616, 4.214311054), (79.677312855, 4.214311054), (69.677312855, 14.214311054), (69.677312855, 34.214311054), (35.605382616, 34.214311054), align=None)
    cut_extrude_30_tool1 = extrude(cut_extrude_30_sk1.sketch, amount=-CUT_EXTRUDE_30_REACH, mode=Mode.PRIVATE) & part.part
    # 草图58 → 切除-拉伸30 (cut, up to next)
    with BuildSketch(Plane.XZ.offset(-1), mode=Mode.PRIVATE) as cut_extrude_30_sk2:
        with Locations((-57.641347736, 19.214311054)):
            Rectangle(SKETCH_58_W, SKETCH_58_H)
    cut_extrude_30_tool2 = extrude(cut_extrude_30_sk2.sketch, amount=-CUT_EXTRUDE_30_REACH, mode=Mode.PRIVATE) & part.part
    add(cut_extrude_30_tool1.solids().sort_by_distance((53.591268, 1, 18.670237))[0], mode=Mode.SUBTRACT)
    add(cut_extrude_30_tool2.solids().sort_by_distance((-57.641348, 1, 19.214311))[0], mode=Mode.SUBTRACT)

    # 草图62 → 切除-拉伸33 (cut, up to next)
    with BuildSketch(Plane(origin=(0, -24.230844379, 16.966619891), x_dir=(-1, 0, 0), z_dir=(0, -0.819152044288991, 0.5735764363510473)), mode=Mode.PRIVATE) as cut_extrude_33_sk1:
        with Locations((0.35, -70.241285348)):
            Rectangle(SKETCH_62_W, SKETCH_62_H)
    cut_extrude_33_tool1 = extrude(cut_extrude_33_sk1.sketch, amount=-CUT_EXTRUDE_33_REACH, mode=Mode.PRIVATE) & part.part
    add(cut_extrude_33_tool1.solids().sort_by_distance((-0.35, 16.057902, 74.504912))[0], mode=Mode.SUBTRACT)

    # 圆角18
    fillet_18_edges = [part.edges().sort_by_distance(p)[0] for p in [
        (35.605382616, 2, 34.214311054),
        (-35.605382616, 2, 34.214311054),
        (-35.605382616, 2, 4.214311054),
        (35.605382616, 2, 4.214311054),
    ]]
    fillet(fillet_18_edges, radius=FILLET_18_R)

    # 草图63 → 切除-拉伸34 (cut)
    with BuildSketch(Plane(origin=(0, -13.374132631, -15.938670611), x_dir=(-1, 0, 0), z_dir=(0, -0.6427876096865379, -0.7660444431189792))):
        with Locations(Location((-52.5, 24.235731917, 0), (0, 0, 90))):
            Circle(SKETCH_63_R)
        with Locations(Location((-17.5, 24.235731917, 0), (0, 0, 90))):
            Circle(SKETCH_63_R)
        with Locations(Location((17.5, 24.235731917, 0), (0, 0, 90))):
            Circle(SKETCH_63_R)
        with Locations(Location((52.5, 24.235731917, 0), (0, 0, 90))):
            Circle(SKETCH_63_R)
    extrude(amount=-CUT_EXTRUDE_34_DEPTH, mode=Mode.SUBTRACT)

    # 草图64 → 切除-拉伸35 (cut, up to next)
    with BuildSketch(Plane.XZ.offset(-1), mode=Mode.PRIVATE) as cut_extrude_35_sk1:
        Polygon((73.677312855, 4.214311054), (82.5, -4.608376091), (82.5, 4.214311054), align=None)
    cut_extrude_35_tool1 = extrude(cut_extrude_35_sk1.sketch, amount=-CUT_EXTRUDE_35_REACH, mode=Mode.PRIVATE) & part.part
    # 草图64 → 切除-拉伸35 (cut, up to next)
    with BuildSketch(Plane.XZ.offset(-1), mode=Mode.PRIVATE) as cut_extrude_35_sk2:
        Polygon((-73.677312855, 4.214311054), (-82.5, -4.608376091), (-82.5, 4.214311054), align=None)
    cut_extrude_35_tool2 = extrude(cut_extrude_35_sk2.sketch, amount=-CUT_EXTRUDE_35_REACH, mode=Mode.PRIVATE) & part.part
    add(cut_extrude_35_tool1.solids().sort_by_distance((79.559104, 1, 1.273415))[0], mode=Mode.SUBTRACT)
    add(cut_extrude_35_tool2.solids().sort_by_distance((-79.559104, 1, 1.273415))[0], mode=Mode.SUBTRACT)

    # 草图67 → 凸台-拉伸16 (add, two sides: drawn at the far end of the back side and taken through both)
    with BuildSketch(Plane(origin=(0, 0, 34.214311054), x_dir=(-1, 0, 0), z_dir=(0, 0, -1)).offset(-EXTRUDE_16_DEPTH_BACK)):
        Polygon((-93.5, 3), (-92.5, 3), (-86.796922418, 3), (-69.677312855, 3), (-39.605382616, 3), (-35.605382616, 3), (-35.605382616, 1), (-39.605382616, 1), (-69.677312855, 1), (-86.796922418, 1), (-92.5, 1), (-93.5, 1), (-96.5, 1), (-96.5, 3), align=None)
        Polygon((69.677312855, 3), (39.605382616, 3), (35.605382616, 3), (35.605382616, 1), (39.605382616, 1), (69.677312855, 1), (86.796922418, 1), (92.5, 1), (93.5, 1), (96.5, 1), (96.5, 3), (93.5, 3), (92.5, 3), (86.796922418, 3), align=None)
    extrude(amount=EXTRUDE_16_DEPTH + EXTRUDE_16_DEPTH_BACK)

    # 圆角23
    fillet_23_edges = [part.edges().sort_by_distance(p)[0] for p in [
        (-35.605382616, 2, 26.214311054),
        (-96.5, 2, 26.214311054),
        (96.5, 2, 26.214311054),
        (35.605382616, 2, 26.214311054),
    ]]
    fillet(fillet_23_edges, radius=FILLET_23_R)

    # 圆角25
    # the kernel refuses this fillet: 6 mm, written as the material it adds along each edge
    with BuildSketch(Plane(origin=(-76.320712464, 13.81647199, -36.143482341), x_dir=(-1.0, 8.907019491368926e-11, -7.473874667401355e-11), z_dir=(0, -0.6427876096865379, -0.7660444431189792))) as fillet_25_piece_1:
        with BuildLine():
            CenterArc((3.335359313, 6), FILLET_25_R, 236.227740467, 33.772259527)
            Line((0, 1.012477744), (0, 0))
            Line((0, 0), (3.335359312, 0))
        make_face()
    extrude(amount=2)
    # the kernel refuses this fillet: 6 mm, written as the material it takes off along each edge
    with BuildSketch(Plane(origin=(82.5, -5.213203436, -4.608376091), x_dir=(0, 0, -1), z_dir=(0, 1, 0)), Plane(origin=(73.677312855, -5.213203436, 4.214311054), x_dir=(0.707106781186546, 0, -0.7071067811865489), z_dir=(0, 1, 0)), Plane(origin=(-82.5, -5.213203436, -4.608376091), x_dir=(0.7071067811865464, 0, 0.7071067811865486), z_dir=(0, 1, 0)), Plane(origin=(-73.677312855, -5.213203436, 4.214311054), x_dir=(1, 0, 0), z_dir=(0, 1, 0))) as fillet_25_2_piece_1:
        with BuildLine():
            CenterArc((FILLET_25_R * 0.414213562373, FILLET_25_R), FILLET_25_R, 225, 45)
            Line((-FILLET_25_R * 0.292893218813, FILLET_25_R * 0.292893218813), (0, 0))
            Line((0, 0), (FILLET_25_R * 0.414213562373, 0))
        make_face()
    extrude(amount=14.426406871, mode=Mode.SUBTRACT)

    # 草图69 → 切除-拉伸36 (cut)
    with BuildSketch(Plane(origin=(0, -13.374132631, -15.938670611), x_dir=(-1, 0, 0), z_dir=(0, -0.6427876096865379, -0.7660444431189792))):
        Polygon((-82.5, 25.536955804), (-74.852049824, 34.829091955), (-83.09997169, 34.829091955), align=None)
        Polygon((83.09997169, 34.829091955), (82.5, 25.536955804), (74.852049824, 34.829091955), align=None)
    extrude(amount=-CUT_EXTRUDE_36_DEPTH, mode=Mode.SUBTRACT)

    # 圆角26
    fillet_26_edges = [part.edges().sort_by_distance(p)[0] for p in [
        (74.852049824, 13.94928733, -37.560334933),
        (82.5, 6.831098067, -31.587464948),
        (-74.852049824, 13.94928733, -37.560334933),
        (-82.5, 6.831098067, -31.587464948),
    ]]
    fillet(fillet_26_edges, radius=FILLET_26_R)

    # 圆角27
    # the kernel refuses this fillet: 10 mm, written as the material it takes off along each edge
    with BuildSketch(Plane(origin=(96.5, -19.478801107, 62.383195729), x_dir=(-1, 0, 0), z_dir=(0, 0.819152044288991, -0.5735764363510473)), Plane(origin=(-96.5, -19.478801107, 62.383195729), x_dir=(0, -0.5735764363510473, -0.819152044288991), z_dir=(0, 0.819152044288991, -0.5735764363510473))) as fillet_27_piece_1:
        with BuildLine():
            CenterArc((FILLET_27_R, -FILLET_27_R), FILLET_27_R, 90, 90)
            Line((0, -FILLET_27_R), (0, 0))
            Line((0, 0), (FILLET_27_R, 0))
        make_face()
    extrude(amount=52.441549178, mode=Mode.SUBTRACT)

    # 草图72 → 切除-拉伸38 (cut, up to next)
    with BuildSketch(Plane(origin=(0, 3, 0), x_dir=(1, 0, 0), z_dir=(0, 1, 0)), mode=Mode.PRIVATE) as cut_extrude_38_sk1:
        with Locations(Location((-25.000820268, -37.552871048, 0), (0, 0, 270))):
            Circle(SKETCH_72_R)
    cut_extrude_38_tool1 = extrude(cut_extrude_38_sk1.sketch, amount=-CUT_EXTRUDE_38_REACH, mode=Mode.PRIVATE) & part.part
    # 草图72 → 切除-拉伸38 (cut, up to next)
    with BuildSketch(Plane(origin=(0, 3, 0), x_dir=(1, 0, 0), z_dir=(0, 1, 0)), mode=Mode.PRIVATE) as cut_extrude_38_sk2:
        with Locations(Location((25.000820268, -37.552871048, 0), (0, 0, 270))):
            Circle(SKETCH_72_R)
    cut_extrude_38_tool2 = extrude(cut_extrude_38_sk2.sketch, amount=-CUT_EXTRUDE_38_REACH, mode=Mode.PRIVATE) & part.part
    add(cut_extrude_38_tool1.solids().sort_by_distance((-25.00082, 3, 37.552871))[0], mode=Mode.SUBTRACT)
    add(cut_extrude_38_tool2.solids().sort_by_distance((25.00082, 3, 37.552871))[0], mode=Mode.SUBTRACT)


solid = part.part
